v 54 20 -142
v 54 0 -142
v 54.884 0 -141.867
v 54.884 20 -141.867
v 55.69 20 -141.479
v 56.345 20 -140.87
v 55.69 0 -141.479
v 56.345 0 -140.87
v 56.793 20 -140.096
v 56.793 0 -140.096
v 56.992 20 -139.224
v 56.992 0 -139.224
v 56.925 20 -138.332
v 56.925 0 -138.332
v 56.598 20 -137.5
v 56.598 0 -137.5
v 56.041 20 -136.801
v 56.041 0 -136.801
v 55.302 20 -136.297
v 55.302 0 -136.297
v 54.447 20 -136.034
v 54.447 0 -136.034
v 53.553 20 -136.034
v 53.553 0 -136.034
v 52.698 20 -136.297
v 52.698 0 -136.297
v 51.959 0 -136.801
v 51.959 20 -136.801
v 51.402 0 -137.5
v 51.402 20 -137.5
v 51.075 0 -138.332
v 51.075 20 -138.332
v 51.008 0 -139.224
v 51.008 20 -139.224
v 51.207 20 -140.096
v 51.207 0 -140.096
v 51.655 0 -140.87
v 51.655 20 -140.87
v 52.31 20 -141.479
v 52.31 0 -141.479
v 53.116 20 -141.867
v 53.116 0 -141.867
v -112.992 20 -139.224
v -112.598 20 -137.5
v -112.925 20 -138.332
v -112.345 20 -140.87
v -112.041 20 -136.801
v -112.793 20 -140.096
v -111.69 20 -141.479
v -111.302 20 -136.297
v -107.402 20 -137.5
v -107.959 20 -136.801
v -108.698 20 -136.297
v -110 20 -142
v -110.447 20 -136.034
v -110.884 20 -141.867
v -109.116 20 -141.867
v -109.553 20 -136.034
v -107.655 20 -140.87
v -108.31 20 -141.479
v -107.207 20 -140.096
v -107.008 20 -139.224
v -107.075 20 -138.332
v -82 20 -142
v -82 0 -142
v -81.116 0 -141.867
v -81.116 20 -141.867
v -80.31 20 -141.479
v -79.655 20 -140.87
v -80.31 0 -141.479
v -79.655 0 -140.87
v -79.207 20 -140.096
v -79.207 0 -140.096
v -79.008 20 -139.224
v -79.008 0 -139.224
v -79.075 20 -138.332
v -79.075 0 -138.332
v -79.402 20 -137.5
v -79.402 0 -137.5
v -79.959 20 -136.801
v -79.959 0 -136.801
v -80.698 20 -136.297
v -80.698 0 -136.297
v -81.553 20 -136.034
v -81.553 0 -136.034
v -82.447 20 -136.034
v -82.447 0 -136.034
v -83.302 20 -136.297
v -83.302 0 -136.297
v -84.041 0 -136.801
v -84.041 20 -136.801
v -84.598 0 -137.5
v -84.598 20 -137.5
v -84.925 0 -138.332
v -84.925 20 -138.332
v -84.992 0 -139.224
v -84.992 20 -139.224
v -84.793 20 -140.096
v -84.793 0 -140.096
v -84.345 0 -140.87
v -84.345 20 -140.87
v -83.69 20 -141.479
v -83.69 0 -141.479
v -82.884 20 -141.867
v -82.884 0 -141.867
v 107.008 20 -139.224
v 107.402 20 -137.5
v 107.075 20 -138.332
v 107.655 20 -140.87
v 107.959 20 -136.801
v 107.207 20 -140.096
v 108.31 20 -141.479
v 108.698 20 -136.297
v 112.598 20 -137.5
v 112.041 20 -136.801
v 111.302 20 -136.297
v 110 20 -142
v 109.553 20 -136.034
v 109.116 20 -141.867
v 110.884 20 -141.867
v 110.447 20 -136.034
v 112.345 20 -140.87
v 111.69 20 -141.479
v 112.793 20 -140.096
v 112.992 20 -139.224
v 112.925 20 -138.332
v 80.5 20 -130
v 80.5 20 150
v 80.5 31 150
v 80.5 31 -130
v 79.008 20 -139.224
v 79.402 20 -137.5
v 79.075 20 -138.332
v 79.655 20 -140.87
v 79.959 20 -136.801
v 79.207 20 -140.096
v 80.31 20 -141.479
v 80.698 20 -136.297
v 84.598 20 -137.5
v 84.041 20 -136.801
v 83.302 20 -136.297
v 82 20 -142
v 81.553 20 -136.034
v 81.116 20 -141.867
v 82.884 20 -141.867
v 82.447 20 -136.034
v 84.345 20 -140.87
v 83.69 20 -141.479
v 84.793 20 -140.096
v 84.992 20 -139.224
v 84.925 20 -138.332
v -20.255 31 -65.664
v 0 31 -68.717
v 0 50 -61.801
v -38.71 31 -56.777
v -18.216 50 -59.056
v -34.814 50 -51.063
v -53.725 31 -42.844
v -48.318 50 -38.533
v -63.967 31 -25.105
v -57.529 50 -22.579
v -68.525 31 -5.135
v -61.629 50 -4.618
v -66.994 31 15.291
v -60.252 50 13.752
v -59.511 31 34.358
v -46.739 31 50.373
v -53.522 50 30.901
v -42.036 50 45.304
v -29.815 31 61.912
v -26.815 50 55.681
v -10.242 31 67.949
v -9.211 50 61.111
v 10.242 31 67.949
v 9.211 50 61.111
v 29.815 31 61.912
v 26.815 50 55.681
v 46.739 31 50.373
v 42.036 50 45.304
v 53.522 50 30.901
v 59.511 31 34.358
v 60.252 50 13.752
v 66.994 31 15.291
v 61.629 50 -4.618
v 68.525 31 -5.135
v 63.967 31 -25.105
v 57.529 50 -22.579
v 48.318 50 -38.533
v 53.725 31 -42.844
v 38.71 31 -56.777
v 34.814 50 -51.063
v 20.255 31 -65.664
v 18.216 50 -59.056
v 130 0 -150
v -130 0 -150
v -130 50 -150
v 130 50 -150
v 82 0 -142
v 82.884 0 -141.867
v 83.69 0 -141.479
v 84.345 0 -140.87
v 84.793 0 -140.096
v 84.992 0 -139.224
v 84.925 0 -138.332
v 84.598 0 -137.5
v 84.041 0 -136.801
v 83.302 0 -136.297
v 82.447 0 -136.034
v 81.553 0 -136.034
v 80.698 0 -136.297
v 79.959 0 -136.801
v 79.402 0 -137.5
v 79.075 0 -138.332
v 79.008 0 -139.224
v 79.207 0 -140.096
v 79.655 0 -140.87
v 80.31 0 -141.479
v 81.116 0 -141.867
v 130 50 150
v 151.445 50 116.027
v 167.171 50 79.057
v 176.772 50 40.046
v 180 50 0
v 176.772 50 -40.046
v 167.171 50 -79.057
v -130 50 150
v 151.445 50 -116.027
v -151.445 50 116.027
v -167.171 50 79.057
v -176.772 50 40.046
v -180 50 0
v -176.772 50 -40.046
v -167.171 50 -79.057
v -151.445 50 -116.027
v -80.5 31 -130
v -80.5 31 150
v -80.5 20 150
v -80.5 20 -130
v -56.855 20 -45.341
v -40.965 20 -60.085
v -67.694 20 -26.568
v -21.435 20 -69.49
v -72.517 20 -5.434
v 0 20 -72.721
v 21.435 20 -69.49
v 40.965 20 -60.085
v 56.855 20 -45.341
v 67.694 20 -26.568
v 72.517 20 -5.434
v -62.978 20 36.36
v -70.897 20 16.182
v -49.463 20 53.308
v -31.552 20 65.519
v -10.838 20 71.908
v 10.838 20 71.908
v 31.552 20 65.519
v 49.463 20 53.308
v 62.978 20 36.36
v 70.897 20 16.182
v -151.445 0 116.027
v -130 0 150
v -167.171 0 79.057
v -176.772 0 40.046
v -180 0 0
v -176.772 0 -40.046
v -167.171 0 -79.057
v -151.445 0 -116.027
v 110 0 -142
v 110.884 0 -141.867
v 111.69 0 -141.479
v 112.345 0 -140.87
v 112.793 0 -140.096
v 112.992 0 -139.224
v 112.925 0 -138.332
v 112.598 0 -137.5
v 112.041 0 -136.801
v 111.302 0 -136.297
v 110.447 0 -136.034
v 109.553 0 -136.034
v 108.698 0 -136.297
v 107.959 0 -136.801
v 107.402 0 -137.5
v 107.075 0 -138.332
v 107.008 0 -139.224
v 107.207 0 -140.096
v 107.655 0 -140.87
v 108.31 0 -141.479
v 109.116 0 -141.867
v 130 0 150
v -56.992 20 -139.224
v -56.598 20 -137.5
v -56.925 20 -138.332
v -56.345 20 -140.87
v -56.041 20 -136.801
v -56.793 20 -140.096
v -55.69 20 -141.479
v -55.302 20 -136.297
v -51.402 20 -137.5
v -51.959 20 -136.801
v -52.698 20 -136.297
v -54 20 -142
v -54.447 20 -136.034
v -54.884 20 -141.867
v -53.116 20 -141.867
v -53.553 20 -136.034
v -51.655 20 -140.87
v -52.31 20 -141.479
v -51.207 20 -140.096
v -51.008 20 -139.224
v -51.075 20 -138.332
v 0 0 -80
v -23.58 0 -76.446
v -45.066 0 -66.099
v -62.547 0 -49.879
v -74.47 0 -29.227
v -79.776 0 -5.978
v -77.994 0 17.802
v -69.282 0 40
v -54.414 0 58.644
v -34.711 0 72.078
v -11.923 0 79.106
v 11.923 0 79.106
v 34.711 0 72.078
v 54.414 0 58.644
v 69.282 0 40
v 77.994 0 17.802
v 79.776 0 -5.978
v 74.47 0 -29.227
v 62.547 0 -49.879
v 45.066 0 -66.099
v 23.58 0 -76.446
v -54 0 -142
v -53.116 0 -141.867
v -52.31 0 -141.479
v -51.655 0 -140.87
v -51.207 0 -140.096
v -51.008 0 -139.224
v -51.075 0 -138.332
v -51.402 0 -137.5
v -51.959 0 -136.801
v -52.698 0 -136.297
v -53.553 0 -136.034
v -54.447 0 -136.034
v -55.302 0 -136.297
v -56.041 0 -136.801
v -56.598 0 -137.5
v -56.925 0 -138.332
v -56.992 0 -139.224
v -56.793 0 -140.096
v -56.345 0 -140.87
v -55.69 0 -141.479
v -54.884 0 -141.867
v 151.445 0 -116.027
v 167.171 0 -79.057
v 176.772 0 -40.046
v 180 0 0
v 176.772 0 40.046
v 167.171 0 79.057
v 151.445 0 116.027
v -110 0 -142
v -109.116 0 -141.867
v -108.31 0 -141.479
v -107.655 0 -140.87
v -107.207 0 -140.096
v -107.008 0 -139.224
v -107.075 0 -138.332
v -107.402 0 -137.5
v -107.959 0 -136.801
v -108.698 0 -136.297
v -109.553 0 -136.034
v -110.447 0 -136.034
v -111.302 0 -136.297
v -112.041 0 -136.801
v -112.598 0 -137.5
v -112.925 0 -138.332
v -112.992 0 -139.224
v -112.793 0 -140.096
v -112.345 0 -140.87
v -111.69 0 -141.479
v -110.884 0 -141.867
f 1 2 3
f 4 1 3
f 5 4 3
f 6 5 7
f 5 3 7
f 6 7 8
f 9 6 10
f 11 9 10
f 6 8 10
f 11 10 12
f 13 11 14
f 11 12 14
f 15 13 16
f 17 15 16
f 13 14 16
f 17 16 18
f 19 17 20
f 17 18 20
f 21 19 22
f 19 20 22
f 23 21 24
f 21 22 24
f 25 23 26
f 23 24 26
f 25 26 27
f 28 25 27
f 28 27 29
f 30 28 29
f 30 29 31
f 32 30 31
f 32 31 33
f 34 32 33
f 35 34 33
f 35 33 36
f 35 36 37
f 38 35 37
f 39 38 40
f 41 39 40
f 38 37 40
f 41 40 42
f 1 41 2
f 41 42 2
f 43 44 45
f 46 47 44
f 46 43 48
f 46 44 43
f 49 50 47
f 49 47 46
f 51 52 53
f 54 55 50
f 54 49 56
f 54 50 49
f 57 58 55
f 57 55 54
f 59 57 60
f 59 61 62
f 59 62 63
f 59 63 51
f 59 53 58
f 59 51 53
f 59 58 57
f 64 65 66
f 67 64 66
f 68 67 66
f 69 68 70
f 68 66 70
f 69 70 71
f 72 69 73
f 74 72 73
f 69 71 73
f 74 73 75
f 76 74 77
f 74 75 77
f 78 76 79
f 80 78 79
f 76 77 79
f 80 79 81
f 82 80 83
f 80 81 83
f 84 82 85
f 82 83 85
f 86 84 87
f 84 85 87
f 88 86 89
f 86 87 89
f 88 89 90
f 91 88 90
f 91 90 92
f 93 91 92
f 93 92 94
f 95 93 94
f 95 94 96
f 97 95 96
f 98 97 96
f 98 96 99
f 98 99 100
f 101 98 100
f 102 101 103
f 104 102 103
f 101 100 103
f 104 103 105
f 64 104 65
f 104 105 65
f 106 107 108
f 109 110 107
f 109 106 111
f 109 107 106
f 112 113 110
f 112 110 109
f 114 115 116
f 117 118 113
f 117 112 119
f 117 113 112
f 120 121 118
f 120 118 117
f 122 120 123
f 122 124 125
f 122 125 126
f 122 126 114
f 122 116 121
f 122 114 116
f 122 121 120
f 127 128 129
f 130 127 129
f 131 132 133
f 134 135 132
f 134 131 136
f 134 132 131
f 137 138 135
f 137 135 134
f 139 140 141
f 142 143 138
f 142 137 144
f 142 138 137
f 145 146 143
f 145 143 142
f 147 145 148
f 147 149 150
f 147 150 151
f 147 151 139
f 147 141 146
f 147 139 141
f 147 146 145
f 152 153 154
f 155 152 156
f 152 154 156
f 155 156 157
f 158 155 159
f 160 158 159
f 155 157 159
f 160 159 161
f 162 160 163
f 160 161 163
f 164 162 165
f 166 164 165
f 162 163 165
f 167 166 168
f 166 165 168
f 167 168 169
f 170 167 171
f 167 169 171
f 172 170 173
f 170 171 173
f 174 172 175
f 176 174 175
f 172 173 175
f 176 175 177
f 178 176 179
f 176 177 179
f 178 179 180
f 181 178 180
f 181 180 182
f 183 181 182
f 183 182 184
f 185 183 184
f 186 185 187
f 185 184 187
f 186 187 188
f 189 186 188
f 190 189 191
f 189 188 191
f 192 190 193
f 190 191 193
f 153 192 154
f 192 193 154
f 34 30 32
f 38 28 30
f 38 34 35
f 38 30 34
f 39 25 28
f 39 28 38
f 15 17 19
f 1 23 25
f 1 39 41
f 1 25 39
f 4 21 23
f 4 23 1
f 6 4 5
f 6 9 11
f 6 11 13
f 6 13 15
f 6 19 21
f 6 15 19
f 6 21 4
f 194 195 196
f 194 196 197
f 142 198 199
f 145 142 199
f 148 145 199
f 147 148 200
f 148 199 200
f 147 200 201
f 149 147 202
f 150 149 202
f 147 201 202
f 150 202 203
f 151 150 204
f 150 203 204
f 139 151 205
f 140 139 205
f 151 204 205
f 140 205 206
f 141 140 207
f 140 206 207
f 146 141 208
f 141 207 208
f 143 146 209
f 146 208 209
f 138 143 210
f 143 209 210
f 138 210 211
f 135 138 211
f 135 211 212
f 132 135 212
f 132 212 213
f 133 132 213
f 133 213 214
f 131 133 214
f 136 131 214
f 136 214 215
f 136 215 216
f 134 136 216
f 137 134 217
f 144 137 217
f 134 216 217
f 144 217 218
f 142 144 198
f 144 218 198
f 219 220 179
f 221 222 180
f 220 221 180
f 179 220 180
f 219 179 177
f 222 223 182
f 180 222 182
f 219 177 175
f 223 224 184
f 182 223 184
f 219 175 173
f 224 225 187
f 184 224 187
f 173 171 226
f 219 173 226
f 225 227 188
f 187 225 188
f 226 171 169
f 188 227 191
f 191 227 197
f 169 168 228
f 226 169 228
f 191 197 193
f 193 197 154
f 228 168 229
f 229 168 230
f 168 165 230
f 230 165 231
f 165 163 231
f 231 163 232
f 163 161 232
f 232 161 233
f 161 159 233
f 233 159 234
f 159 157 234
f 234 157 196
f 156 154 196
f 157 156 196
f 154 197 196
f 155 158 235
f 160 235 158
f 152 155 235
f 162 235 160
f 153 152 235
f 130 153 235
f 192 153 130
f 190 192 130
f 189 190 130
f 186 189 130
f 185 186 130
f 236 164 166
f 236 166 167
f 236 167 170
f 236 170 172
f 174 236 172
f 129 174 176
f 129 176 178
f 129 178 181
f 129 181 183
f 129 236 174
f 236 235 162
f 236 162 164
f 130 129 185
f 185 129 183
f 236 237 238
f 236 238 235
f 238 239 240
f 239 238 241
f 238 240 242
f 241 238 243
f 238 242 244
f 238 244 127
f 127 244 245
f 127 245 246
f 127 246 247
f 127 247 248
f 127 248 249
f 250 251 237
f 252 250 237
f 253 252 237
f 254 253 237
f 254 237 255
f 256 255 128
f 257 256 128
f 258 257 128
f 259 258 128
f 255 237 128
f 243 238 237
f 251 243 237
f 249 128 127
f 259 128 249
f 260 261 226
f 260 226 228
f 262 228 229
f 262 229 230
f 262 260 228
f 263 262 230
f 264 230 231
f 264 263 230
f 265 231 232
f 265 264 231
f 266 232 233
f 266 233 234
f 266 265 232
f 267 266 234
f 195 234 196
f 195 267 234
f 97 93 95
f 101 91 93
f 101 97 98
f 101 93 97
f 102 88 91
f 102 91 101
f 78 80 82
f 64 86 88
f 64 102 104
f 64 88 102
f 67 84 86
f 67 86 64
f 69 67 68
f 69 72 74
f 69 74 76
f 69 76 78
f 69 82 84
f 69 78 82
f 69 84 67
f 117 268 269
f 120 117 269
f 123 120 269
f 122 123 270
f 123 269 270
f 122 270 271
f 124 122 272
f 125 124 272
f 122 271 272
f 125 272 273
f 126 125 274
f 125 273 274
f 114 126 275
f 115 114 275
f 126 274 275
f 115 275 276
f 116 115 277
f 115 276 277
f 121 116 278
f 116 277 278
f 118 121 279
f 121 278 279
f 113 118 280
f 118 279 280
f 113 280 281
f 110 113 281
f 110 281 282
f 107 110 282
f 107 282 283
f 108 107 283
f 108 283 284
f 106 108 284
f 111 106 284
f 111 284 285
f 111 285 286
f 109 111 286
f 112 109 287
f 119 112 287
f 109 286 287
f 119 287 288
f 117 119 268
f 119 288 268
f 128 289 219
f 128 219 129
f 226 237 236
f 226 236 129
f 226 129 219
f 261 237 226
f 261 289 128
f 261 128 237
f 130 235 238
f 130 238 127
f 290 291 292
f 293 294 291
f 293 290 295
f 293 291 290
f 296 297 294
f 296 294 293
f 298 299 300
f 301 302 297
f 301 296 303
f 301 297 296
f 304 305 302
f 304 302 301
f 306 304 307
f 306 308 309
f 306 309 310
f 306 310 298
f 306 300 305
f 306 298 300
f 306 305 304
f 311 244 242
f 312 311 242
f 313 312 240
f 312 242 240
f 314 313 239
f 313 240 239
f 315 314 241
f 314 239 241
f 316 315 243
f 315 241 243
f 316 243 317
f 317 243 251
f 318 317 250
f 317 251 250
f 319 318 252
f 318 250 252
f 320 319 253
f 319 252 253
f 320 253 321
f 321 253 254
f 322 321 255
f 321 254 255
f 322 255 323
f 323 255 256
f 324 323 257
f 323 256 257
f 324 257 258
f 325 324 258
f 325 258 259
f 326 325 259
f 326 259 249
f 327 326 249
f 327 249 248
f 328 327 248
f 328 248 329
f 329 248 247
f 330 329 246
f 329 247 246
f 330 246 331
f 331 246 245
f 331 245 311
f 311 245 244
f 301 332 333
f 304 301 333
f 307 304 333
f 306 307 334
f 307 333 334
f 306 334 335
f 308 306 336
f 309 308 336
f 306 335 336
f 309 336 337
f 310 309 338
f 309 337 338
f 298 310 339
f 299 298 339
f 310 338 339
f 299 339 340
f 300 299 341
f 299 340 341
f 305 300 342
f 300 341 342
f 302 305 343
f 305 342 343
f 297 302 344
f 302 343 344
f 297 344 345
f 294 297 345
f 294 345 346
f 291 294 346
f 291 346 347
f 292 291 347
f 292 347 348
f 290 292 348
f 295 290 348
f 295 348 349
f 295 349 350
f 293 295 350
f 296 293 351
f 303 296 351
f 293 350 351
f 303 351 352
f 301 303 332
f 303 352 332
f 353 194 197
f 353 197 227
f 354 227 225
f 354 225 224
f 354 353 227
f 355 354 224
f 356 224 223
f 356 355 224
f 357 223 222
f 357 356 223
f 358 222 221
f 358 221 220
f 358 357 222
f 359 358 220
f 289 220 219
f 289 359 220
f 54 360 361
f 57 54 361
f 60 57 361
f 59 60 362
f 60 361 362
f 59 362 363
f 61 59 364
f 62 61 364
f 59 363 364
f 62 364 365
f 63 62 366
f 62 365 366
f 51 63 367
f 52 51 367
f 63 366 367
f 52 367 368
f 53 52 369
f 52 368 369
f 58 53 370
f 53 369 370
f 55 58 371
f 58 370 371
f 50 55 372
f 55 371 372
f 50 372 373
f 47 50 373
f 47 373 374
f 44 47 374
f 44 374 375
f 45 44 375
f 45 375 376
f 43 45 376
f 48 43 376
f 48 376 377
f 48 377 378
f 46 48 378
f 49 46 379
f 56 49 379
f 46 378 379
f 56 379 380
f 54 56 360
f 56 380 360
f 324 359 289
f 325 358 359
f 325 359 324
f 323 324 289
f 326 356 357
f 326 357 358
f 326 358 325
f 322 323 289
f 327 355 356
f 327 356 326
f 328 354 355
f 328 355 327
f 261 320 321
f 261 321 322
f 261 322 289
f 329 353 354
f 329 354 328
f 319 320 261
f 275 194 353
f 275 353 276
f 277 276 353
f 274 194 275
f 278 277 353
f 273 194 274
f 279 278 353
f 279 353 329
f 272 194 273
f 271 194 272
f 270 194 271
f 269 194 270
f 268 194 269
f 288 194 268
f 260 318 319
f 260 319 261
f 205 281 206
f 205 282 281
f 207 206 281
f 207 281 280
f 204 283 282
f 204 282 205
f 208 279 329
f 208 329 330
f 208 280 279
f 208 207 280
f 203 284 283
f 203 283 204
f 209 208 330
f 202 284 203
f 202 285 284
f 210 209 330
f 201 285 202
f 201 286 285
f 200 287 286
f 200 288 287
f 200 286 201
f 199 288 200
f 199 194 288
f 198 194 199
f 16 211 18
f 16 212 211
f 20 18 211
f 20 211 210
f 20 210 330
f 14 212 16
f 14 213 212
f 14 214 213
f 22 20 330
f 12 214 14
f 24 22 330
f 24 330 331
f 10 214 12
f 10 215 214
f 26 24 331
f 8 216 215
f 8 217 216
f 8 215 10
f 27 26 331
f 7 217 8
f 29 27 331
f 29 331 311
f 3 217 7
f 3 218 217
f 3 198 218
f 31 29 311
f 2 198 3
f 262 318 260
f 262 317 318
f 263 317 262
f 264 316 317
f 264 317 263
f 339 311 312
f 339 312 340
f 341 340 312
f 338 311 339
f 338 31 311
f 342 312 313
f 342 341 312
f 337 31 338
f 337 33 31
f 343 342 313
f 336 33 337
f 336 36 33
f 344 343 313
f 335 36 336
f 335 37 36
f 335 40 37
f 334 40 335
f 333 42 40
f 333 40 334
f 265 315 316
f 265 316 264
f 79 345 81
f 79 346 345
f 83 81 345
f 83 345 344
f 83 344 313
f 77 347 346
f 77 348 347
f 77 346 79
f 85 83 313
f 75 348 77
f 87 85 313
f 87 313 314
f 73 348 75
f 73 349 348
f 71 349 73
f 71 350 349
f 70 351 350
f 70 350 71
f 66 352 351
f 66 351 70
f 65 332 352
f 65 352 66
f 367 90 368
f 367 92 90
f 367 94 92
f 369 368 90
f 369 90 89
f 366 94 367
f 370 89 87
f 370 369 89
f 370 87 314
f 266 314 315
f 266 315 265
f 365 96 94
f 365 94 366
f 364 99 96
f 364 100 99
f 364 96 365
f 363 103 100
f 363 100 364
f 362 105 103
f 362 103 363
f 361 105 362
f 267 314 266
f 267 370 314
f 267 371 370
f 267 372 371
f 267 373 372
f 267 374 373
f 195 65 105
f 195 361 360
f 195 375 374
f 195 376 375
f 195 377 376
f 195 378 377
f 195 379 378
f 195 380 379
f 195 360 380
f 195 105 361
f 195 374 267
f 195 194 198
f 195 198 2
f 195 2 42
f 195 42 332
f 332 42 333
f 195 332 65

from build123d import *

# Parameters (mm, degrees)
BOSS_EXTRUDE1_DEPTH  = 50
CARBON_FILTER_HOLE_W = 161
CARBON_FILTER_HOLE_H = 11
CUT_EXTRUDE3_DEPTH   = 280
SKETCH1_R            = 3
CUT_EXTRUDE4_DEPTH   = 20


with BuildPart() as part:
    # Lid case → Boss-Extrude1 (new body)
    with BuildSketch(Plane(origin=(0, 0, 0), x_dir=(1, 0, 0), z_dir=(0, 1, 0))):
        with BuildLine():
            Line((-130, 150), (130, 150))
            ThreePointArc((130, 150), (180, 0), (130, -150))
            Line((130, -150), (-130, -150))
            ThreePointArc((-130, -150), (-180, 0), (-130, 150))
        make_face()
    extrude(amount=BOSS_EXTRUDE1_DEPTH)

    # Ventilation → Cut-Revolve1 (revolve, cut)
    with BuildSketch(Plane.XY, mode=Mode.PRIVATE) as cut_revolve1_sk:
        Polygon((0, 50), (0, 0), (-80, 0), (-61.801488287, 50), align=None)
    revolve(cut_revolve1_sk.sketch.rotate(Axis((0, -54.373231572, 0), (0, 1, 0)), 270), axis=Axis((0, -54.373231572, 0), (0, 1, 0)), mode=Mode.SUBTRACT)

    # Carbon filter hole → Cut-Extrude3 (cut)
    with BuildSketch(Plane.XY.offset(150)):
        with Locations((0, 25.5)):
            Rectangle(CARBON_FILTER_HOLE_W, CARBON_FILTER_HOLE_H)
    extrude(amount=-CUT_EXTRUDE3_DEPTH, mode=Mode.SUBTRACT)

    # Sketch1 → Cut-Extrude4 (cut)
    with BuildSketch(Plane.XZ):
        with Locations(Location((-110, -139, 0), (0, 0, 270))):
            Circle(SKETCH1_R)
        with Locations(Location((-82, -139, 0), (0, 0, 270))):
            Circle(SKETCH1_R)
        with Locations(Location((-54, -139, 0), (0, 0, 270))):
            Circle(SKETCH1_R)
        with Locations(Location((54, -139, 0), (0, 0, 270))):
            Circle(SKETCH1_R)
        with Locations(Location((82, -139, 0), (0, 0, 270))):
            Circle(SKETCH1_R)
        with Locations(Location((110, -139, 0), (0, 0, 270))):
            Circle(SKETCH1_R)
    extrude(amount=-CUT_EXTRUDE4_DEPTH, mode=Mode.SUBTRACT)


solid = part.part
